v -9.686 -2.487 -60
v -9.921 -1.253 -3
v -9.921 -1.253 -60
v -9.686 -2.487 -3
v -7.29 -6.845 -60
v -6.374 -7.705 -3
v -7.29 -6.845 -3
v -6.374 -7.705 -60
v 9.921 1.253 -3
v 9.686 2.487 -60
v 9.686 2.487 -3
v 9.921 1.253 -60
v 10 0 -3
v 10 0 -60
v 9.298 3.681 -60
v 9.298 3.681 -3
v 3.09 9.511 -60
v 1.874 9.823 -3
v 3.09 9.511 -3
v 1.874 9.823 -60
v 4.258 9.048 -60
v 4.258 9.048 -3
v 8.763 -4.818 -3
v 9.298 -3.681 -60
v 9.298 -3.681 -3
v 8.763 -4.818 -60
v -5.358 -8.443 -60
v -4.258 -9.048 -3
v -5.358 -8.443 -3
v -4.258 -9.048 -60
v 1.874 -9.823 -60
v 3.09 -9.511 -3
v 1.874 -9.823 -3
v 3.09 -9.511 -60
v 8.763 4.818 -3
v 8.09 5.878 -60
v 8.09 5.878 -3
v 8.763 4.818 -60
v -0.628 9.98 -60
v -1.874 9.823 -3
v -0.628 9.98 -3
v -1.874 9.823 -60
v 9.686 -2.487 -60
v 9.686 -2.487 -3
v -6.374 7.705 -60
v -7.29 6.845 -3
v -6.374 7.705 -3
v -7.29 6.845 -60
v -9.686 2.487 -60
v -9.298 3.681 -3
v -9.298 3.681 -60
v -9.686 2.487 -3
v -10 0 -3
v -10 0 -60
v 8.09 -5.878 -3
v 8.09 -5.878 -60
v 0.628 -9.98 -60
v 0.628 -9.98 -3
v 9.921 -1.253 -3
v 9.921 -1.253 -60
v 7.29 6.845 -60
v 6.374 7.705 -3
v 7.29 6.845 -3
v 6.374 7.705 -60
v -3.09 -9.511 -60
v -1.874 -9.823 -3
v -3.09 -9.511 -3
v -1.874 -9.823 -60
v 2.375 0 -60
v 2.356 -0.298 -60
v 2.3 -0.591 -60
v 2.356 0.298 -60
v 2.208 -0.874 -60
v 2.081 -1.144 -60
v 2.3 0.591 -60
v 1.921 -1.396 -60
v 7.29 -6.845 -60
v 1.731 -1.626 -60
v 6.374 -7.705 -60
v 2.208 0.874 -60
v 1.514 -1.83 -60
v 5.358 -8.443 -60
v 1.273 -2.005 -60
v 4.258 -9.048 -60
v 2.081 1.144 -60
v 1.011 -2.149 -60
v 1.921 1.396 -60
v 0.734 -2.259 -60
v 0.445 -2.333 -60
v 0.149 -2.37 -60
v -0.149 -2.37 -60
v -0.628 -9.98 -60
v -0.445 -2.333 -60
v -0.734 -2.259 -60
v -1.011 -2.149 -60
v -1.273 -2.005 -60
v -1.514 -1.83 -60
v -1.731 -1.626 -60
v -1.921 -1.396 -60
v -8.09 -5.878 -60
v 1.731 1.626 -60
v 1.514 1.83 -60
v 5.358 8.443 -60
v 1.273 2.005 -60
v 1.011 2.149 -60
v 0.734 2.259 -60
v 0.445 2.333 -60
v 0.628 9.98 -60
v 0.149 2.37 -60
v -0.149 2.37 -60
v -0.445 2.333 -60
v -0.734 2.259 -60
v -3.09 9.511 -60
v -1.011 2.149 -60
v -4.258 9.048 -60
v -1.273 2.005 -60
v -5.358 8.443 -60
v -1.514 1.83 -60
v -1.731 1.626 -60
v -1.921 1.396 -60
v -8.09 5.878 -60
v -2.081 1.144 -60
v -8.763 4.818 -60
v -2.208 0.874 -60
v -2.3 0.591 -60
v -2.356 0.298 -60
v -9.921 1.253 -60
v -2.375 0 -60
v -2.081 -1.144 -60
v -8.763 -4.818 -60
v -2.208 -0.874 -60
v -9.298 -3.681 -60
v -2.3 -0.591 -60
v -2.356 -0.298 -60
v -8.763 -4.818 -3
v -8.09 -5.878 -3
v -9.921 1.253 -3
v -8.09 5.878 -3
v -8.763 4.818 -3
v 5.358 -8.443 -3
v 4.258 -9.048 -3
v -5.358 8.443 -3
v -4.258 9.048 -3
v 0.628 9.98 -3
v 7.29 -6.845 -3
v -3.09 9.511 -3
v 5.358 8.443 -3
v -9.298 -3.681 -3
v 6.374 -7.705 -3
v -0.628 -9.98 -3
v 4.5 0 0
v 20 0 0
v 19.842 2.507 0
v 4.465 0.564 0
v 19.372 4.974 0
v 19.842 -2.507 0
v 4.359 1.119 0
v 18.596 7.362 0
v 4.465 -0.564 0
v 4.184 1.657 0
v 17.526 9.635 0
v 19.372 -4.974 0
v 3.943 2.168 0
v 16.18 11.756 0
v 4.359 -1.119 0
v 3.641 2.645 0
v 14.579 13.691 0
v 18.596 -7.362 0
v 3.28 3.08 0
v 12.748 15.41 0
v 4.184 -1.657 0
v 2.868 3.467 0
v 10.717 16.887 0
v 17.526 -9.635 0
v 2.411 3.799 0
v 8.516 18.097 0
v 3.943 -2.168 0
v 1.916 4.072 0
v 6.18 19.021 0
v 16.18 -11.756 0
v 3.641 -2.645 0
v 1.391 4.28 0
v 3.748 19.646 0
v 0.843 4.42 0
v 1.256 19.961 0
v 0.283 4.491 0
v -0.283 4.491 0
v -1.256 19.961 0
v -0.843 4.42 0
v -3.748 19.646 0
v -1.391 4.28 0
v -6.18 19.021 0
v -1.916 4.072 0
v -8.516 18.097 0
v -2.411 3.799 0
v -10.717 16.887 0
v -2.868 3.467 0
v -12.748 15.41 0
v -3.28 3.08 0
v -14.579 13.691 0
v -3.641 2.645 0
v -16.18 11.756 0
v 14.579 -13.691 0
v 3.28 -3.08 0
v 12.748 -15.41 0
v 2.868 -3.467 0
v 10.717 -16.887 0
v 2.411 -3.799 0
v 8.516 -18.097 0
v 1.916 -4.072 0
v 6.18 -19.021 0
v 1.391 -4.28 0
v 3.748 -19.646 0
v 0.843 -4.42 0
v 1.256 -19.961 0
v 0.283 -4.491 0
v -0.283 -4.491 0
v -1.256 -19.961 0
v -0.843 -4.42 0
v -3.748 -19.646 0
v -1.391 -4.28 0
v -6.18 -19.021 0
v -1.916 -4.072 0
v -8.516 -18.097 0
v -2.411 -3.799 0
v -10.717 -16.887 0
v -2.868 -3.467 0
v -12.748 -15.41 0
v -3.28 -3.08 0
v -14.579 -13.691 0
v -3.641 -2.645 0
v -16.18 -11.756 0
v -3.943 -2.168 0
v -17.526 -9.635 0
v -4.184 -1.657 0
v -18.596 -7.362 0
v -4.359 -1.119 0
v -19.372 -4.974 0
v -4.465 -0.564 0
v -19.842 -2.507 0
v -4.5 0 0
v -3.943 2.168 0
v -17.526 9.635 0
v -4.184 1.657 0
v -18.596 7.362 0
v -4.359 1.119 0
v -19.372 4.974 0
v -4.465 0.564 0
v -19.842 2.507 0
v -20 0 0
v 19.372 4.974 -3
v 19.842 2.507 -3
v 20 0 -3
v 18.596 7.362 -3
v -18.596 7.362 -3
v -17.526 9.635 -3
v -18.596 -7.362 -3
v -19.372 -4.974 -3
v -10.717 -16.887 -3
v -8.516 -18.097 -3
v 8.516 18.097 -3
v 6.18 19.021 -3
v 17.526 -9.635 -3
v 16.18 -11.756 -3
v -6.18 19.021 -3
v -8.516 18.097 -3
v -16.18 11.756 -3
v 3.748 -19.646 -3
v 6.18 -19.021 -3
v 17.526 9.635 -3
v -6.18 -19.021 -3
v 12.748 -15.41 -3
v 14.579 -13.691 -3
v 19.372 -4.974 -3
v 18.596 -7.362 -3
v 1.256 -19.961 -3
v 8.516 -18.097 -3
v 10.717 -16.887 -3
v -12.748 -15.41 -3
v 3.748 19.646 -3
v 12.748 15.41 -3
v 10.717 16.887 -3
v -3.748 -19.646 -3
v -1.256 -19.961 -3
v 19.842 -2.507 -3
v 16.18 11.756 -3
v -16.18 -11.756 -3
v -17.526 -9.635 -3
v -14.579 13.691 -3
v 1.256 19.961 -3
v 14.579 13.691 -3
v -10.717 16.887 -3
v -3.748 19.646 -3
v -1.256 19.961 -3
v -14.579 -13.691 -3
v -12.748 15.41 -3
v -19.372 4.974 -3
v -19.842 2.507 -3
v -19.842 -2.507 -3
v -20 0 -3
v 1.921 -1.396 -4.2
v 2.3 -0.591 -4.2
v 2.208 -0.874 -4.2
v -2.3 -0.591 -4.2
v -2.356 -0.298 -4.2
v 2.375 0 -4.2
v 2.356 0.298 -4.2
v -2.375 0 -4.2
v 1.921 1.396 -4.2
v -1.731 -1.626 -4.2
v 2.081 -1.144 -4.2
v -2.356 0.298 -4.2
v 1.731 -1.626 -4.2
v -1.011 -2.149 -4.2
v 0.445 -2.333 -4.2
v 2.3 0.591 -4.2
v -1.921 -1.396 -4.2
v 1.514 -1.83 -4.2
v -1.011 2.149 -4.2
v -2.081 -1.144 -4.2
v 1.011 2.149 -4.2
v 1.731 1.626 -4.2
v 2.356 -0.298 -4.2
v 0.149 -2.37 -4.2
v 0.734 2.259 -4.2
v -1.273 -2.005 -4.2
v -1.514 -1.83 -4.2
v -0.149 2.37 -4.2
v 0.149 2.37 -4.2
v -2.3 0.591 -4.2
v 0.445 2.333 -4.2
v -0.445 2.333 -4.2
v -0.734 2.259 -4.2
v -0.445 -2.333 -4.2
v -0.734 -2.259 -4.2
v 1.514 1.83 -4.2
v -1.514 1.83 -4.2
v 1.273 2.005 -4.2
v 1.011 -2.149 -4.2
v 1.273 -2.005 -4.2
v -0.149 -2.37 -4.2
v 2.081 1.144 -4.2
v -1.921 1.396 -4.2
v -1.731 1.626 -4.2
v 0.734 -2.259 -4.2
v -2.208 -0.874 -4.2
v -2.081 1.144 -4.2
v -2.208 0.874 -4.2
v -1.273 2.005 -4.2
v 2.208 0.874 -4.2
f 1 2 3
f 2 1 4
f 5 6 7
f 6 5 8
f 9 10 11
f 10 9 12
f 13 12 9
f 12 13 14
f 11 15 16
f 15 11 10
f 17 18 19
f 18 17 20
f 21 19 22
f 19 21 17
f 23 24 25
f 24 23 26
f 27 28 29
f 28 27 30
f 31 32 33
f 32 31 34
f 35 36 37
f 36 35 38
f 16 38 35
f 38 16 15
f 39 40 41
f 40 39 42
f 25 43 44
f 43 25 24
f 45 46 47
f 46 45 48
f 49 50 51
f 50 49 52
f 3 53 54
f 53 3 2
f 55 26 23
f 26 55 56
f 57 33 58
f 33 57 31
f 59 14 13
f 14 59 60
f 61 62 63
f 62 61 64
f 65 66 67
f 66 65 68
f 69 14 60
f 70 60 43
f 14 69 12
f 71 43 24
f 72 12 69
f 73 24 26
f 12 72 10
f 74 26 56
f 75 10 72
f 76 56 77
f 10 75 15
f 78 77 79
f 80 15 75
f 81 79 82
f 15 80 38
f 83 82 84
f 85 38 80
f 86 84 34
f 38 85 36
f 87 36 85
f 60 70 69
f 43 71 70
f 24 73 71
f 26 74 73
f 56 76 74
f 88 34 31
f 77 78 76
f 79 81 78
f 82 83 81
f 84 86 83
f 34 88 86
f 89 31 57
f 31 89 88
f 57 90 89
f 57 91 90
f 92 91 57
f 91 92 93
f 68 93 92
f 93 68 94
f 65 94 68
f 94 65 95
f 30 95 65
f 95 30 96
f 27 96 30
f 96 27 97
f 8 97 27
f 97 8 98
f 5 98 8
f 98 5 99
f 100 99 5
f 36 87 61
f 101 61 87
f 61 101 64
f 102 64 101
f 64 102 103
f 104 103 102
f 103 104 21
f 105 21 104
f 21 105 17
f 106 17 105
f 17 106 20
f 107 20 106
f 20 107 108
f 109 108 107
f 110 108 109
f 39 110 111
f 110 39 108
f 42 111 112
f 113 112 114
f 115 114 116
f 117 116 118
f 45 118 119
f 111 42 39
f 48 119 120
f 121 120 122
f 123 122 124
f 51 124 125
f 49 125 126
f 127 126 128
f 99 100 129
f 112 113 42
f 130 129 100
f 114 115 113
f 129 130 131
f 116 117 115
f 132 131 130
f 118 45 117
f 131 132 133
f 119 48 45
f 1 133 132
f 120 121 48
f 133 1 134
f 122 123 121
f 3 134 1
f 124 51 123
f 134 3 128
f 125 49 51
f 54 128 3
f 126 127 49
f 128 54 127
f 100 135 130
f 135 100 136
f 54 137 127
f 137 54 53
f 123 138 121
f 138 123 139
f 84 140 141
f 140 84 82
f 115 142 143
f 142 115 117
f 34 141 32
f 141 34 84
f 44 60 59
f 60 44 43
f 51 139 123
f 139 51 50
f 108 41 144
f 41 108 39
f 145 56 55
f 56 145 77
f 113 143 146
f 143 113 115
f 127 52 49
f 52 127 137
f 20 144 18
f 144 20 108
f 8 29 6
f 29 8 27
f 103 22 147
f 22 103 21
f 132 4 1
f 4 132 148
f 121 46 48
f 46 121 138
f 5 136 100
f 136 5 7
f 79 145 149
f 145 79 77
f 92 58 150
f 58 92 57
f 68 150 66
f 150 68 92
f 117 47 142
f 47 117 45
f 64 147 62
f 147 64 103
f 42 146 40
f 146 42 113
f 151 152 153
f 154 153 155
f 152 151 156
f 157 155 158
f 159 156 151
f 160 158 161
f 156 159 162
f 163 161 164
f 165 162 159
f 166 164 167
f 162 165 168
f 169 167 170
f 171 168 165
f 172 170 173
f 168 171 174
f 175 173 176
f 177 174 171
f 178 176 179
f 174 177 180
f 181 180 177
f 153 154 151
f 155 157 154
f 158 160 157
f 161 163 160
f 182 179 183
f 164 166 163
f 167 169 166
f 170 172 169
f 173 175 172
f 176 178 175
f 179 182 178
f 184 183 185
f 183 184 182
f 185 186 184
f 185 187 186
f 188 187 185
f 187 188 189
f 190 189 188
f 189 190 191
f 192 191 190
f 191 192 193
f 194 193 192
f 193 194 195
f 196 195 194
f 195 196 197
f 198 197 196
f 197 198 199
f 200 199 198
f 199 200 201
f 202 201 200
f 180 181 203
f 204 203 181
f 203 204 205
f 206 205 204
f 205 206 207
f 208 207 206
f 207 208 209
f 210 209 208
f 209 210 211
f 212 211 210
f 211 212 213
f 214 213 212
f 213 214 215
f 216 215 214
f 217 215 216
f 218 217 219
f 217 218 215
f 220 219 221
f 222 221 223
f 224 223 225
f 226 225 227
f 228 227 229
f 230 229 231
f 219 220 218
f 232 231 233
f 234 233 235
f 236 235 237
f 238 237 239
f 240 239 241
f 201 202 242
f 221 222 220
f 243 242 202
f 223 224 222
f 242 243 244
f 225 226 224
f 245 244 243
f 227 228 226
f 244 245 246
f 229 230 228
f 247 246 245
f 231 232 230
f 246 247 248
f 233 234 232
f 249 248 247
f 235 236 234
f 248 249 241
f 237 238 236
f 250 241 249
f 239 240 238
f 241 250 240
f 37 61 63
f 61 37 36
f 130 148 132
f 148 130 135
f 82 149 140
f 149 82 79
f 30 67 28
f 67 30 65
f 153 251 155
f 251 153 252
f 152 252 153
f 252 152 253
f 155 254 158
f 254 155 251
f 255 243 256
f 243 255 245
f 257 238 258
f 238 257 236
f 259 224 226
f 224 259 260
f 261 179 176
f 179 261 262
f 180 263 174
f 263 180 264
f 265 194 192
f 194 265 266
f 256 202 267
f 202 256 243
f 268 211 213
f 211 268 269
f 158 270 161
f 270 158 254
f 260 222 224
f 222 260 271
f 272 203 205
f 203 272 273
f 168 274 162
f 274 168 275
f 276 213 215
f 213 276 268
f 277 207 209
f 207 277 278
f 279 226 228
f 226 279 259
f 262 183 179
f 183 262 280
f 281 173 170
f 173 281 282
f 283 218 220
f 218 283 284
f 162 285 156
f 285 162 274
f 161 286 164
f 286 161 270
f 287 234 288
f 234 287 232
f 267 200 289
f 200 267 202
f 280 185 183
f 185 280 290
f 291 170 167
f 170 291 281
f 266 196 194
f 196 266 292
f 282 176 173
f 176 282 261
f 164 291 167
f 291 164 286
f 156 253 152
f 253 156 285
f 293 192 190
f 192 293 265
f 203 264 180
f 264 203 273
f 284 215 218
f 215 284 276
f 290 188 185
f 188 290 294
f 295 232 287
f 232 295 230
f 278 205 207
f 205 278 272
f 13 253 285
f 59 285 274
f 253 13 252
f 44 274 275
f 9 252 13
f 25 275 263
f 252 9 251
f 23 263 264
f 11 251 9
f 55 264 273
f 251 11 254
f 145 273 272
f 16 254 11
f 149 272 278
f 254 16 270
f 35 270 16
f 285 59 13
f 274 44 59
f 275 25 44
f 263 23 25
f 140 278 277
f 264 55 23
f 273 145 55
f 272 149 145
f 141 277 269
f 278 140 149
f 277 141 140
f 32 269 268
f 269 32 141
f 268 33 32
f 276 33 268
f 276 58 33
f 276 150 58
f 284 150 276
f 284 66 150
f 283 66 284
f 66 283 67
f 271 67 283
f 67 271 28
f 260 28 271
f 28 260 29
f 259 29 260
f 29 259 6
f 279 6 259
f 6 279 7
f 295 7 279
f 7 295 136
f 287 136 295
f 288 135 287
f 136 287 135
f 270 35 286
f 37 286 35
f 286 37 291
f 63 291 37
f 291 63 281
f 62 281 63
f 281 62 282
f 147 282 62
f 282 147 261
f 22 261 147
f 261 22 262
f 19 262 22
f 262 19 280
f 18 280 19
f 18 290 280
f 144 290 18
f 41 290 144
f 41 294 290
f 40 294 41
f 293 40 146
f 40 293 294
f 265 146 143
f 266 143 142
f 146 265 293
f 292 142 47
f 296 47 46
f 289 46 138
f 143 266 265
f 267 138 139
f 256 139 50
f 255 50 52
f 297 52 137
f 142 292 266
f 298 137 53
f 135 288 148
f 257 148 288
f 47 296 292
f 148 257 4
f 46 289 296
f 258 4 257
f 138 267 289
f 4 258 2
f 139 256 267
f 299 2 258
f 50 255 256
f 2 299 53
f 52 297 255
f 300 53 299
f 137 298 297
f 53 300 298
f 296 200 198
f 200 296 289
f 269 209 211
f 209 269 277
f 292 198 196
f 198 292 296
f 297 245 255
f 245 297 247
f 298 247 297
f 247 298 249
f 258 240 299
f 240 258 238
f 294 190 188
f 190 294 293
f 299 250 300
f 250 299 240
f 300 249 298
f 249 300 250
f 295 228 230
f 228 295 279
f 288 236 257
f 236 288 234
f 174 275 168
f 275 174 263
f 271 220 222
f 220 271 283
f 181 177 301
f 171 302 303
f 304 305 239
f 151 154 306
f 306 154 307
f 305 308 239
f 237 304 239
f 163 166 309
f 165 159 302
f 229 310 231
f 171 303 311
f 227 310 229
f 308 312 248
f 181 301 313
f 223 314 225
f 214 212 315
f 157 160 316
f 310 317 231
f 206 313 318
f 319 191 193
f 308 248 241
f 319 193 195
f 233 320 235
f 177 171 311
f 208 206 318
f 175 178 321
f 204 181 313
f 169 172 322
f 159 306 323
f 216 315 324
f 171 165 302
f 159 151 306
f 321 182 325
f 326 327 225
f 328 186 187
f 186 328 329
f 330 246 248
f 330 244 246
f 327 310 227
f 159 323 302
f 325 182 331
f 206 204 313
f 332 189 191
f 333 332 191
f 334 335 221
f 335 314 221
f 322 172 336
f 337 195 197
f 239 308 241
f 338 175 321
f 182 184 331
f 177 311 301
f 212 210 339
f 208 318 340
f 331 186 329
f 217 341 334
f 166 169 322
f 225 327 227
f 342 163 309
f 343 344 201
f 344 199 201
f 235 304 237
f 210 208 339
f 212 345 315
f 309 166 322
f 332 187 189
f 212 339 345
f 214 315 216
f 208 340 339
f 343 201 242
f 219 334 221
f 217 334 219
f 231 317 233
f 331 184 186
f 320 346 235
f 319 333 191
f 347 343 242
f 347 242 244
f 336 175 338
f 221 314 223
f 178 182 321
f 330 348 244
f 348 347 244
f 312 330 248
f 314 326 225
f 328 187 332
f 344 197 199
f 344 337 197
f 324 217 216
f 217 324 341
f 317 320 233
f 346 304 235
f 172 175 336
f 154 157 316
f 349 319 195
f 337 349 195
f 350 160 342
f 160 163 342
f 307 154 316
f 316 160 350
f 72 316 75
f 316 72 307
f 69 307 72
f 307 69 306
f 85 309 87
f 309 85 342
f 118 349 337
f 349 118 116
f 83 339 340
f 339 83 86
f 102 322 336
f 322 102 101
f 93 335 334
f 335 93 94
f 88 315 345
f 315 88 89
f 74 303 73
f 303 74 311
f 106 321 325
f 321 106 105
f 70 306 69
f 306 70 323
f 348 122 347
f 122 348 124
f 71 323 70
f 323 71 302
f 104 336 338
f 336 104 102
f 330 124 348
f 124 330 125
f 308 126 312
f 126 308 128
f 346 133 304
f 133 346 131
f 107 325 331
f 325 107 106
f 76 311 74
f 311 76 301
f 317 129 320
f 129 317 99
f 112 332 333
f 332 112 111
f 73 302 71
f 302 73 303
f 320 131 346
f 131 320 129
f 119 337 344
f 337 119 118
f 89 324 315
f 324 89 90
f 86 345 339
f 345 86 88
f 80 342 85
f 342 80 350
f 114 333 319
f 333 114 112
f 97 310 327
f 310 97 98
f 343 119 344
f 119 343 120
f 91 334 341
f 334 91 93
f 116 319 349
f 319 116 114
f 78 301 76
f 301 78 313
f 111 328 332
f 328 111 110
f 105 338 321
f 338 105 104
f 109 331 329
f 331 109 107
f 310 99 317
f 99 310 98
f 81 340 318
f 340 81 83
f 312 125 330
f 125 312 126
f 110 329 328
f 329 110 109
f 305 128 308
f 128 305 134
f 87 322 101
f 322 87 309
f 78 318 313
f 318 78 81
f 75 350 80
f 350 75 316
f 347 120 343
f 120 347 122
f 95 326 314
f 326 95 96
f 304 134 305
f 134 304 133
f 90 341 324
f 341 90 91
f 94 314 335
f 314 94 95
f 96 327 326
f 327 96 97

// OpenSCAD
$fn = 50;


difference() {
	union() {
		translate(v = [0, 0, -60.0000000000]) {
			cylinder(h = 60, r = 10.0000000000);
		}
		translate(v = [0, 0, -3.0000000000]) {
			cylinder(h = 3, r = 20.0000000000);
		}
	}
	union() {
		translate(v = [0, 0, 0]) {
			rotate(a = [0, 0, 0]) {
				difference() {
					union() {
						#translate(v = [0, 0, -60.0000000000]) {
							cylinder(h = 60, r = 2.2500000000);
						}
						#translate(v = [0, 0, -4.2000000000]) {
							cylinder(h = 4.2000000000, r1 = 2.3750000000, r2 = 4.5000000000);
						}
						#translate(v = [0, 0, -60.0000000000]) {
							cylinder(h = 60, r = 2.3750000000);
						}
						#translate(v = [0, 0, -60.0000000000]) {
							cylinder(h = 60, r = 2.2500000000);
						}
					}
					union();
				}
			}
		}
	}
}
